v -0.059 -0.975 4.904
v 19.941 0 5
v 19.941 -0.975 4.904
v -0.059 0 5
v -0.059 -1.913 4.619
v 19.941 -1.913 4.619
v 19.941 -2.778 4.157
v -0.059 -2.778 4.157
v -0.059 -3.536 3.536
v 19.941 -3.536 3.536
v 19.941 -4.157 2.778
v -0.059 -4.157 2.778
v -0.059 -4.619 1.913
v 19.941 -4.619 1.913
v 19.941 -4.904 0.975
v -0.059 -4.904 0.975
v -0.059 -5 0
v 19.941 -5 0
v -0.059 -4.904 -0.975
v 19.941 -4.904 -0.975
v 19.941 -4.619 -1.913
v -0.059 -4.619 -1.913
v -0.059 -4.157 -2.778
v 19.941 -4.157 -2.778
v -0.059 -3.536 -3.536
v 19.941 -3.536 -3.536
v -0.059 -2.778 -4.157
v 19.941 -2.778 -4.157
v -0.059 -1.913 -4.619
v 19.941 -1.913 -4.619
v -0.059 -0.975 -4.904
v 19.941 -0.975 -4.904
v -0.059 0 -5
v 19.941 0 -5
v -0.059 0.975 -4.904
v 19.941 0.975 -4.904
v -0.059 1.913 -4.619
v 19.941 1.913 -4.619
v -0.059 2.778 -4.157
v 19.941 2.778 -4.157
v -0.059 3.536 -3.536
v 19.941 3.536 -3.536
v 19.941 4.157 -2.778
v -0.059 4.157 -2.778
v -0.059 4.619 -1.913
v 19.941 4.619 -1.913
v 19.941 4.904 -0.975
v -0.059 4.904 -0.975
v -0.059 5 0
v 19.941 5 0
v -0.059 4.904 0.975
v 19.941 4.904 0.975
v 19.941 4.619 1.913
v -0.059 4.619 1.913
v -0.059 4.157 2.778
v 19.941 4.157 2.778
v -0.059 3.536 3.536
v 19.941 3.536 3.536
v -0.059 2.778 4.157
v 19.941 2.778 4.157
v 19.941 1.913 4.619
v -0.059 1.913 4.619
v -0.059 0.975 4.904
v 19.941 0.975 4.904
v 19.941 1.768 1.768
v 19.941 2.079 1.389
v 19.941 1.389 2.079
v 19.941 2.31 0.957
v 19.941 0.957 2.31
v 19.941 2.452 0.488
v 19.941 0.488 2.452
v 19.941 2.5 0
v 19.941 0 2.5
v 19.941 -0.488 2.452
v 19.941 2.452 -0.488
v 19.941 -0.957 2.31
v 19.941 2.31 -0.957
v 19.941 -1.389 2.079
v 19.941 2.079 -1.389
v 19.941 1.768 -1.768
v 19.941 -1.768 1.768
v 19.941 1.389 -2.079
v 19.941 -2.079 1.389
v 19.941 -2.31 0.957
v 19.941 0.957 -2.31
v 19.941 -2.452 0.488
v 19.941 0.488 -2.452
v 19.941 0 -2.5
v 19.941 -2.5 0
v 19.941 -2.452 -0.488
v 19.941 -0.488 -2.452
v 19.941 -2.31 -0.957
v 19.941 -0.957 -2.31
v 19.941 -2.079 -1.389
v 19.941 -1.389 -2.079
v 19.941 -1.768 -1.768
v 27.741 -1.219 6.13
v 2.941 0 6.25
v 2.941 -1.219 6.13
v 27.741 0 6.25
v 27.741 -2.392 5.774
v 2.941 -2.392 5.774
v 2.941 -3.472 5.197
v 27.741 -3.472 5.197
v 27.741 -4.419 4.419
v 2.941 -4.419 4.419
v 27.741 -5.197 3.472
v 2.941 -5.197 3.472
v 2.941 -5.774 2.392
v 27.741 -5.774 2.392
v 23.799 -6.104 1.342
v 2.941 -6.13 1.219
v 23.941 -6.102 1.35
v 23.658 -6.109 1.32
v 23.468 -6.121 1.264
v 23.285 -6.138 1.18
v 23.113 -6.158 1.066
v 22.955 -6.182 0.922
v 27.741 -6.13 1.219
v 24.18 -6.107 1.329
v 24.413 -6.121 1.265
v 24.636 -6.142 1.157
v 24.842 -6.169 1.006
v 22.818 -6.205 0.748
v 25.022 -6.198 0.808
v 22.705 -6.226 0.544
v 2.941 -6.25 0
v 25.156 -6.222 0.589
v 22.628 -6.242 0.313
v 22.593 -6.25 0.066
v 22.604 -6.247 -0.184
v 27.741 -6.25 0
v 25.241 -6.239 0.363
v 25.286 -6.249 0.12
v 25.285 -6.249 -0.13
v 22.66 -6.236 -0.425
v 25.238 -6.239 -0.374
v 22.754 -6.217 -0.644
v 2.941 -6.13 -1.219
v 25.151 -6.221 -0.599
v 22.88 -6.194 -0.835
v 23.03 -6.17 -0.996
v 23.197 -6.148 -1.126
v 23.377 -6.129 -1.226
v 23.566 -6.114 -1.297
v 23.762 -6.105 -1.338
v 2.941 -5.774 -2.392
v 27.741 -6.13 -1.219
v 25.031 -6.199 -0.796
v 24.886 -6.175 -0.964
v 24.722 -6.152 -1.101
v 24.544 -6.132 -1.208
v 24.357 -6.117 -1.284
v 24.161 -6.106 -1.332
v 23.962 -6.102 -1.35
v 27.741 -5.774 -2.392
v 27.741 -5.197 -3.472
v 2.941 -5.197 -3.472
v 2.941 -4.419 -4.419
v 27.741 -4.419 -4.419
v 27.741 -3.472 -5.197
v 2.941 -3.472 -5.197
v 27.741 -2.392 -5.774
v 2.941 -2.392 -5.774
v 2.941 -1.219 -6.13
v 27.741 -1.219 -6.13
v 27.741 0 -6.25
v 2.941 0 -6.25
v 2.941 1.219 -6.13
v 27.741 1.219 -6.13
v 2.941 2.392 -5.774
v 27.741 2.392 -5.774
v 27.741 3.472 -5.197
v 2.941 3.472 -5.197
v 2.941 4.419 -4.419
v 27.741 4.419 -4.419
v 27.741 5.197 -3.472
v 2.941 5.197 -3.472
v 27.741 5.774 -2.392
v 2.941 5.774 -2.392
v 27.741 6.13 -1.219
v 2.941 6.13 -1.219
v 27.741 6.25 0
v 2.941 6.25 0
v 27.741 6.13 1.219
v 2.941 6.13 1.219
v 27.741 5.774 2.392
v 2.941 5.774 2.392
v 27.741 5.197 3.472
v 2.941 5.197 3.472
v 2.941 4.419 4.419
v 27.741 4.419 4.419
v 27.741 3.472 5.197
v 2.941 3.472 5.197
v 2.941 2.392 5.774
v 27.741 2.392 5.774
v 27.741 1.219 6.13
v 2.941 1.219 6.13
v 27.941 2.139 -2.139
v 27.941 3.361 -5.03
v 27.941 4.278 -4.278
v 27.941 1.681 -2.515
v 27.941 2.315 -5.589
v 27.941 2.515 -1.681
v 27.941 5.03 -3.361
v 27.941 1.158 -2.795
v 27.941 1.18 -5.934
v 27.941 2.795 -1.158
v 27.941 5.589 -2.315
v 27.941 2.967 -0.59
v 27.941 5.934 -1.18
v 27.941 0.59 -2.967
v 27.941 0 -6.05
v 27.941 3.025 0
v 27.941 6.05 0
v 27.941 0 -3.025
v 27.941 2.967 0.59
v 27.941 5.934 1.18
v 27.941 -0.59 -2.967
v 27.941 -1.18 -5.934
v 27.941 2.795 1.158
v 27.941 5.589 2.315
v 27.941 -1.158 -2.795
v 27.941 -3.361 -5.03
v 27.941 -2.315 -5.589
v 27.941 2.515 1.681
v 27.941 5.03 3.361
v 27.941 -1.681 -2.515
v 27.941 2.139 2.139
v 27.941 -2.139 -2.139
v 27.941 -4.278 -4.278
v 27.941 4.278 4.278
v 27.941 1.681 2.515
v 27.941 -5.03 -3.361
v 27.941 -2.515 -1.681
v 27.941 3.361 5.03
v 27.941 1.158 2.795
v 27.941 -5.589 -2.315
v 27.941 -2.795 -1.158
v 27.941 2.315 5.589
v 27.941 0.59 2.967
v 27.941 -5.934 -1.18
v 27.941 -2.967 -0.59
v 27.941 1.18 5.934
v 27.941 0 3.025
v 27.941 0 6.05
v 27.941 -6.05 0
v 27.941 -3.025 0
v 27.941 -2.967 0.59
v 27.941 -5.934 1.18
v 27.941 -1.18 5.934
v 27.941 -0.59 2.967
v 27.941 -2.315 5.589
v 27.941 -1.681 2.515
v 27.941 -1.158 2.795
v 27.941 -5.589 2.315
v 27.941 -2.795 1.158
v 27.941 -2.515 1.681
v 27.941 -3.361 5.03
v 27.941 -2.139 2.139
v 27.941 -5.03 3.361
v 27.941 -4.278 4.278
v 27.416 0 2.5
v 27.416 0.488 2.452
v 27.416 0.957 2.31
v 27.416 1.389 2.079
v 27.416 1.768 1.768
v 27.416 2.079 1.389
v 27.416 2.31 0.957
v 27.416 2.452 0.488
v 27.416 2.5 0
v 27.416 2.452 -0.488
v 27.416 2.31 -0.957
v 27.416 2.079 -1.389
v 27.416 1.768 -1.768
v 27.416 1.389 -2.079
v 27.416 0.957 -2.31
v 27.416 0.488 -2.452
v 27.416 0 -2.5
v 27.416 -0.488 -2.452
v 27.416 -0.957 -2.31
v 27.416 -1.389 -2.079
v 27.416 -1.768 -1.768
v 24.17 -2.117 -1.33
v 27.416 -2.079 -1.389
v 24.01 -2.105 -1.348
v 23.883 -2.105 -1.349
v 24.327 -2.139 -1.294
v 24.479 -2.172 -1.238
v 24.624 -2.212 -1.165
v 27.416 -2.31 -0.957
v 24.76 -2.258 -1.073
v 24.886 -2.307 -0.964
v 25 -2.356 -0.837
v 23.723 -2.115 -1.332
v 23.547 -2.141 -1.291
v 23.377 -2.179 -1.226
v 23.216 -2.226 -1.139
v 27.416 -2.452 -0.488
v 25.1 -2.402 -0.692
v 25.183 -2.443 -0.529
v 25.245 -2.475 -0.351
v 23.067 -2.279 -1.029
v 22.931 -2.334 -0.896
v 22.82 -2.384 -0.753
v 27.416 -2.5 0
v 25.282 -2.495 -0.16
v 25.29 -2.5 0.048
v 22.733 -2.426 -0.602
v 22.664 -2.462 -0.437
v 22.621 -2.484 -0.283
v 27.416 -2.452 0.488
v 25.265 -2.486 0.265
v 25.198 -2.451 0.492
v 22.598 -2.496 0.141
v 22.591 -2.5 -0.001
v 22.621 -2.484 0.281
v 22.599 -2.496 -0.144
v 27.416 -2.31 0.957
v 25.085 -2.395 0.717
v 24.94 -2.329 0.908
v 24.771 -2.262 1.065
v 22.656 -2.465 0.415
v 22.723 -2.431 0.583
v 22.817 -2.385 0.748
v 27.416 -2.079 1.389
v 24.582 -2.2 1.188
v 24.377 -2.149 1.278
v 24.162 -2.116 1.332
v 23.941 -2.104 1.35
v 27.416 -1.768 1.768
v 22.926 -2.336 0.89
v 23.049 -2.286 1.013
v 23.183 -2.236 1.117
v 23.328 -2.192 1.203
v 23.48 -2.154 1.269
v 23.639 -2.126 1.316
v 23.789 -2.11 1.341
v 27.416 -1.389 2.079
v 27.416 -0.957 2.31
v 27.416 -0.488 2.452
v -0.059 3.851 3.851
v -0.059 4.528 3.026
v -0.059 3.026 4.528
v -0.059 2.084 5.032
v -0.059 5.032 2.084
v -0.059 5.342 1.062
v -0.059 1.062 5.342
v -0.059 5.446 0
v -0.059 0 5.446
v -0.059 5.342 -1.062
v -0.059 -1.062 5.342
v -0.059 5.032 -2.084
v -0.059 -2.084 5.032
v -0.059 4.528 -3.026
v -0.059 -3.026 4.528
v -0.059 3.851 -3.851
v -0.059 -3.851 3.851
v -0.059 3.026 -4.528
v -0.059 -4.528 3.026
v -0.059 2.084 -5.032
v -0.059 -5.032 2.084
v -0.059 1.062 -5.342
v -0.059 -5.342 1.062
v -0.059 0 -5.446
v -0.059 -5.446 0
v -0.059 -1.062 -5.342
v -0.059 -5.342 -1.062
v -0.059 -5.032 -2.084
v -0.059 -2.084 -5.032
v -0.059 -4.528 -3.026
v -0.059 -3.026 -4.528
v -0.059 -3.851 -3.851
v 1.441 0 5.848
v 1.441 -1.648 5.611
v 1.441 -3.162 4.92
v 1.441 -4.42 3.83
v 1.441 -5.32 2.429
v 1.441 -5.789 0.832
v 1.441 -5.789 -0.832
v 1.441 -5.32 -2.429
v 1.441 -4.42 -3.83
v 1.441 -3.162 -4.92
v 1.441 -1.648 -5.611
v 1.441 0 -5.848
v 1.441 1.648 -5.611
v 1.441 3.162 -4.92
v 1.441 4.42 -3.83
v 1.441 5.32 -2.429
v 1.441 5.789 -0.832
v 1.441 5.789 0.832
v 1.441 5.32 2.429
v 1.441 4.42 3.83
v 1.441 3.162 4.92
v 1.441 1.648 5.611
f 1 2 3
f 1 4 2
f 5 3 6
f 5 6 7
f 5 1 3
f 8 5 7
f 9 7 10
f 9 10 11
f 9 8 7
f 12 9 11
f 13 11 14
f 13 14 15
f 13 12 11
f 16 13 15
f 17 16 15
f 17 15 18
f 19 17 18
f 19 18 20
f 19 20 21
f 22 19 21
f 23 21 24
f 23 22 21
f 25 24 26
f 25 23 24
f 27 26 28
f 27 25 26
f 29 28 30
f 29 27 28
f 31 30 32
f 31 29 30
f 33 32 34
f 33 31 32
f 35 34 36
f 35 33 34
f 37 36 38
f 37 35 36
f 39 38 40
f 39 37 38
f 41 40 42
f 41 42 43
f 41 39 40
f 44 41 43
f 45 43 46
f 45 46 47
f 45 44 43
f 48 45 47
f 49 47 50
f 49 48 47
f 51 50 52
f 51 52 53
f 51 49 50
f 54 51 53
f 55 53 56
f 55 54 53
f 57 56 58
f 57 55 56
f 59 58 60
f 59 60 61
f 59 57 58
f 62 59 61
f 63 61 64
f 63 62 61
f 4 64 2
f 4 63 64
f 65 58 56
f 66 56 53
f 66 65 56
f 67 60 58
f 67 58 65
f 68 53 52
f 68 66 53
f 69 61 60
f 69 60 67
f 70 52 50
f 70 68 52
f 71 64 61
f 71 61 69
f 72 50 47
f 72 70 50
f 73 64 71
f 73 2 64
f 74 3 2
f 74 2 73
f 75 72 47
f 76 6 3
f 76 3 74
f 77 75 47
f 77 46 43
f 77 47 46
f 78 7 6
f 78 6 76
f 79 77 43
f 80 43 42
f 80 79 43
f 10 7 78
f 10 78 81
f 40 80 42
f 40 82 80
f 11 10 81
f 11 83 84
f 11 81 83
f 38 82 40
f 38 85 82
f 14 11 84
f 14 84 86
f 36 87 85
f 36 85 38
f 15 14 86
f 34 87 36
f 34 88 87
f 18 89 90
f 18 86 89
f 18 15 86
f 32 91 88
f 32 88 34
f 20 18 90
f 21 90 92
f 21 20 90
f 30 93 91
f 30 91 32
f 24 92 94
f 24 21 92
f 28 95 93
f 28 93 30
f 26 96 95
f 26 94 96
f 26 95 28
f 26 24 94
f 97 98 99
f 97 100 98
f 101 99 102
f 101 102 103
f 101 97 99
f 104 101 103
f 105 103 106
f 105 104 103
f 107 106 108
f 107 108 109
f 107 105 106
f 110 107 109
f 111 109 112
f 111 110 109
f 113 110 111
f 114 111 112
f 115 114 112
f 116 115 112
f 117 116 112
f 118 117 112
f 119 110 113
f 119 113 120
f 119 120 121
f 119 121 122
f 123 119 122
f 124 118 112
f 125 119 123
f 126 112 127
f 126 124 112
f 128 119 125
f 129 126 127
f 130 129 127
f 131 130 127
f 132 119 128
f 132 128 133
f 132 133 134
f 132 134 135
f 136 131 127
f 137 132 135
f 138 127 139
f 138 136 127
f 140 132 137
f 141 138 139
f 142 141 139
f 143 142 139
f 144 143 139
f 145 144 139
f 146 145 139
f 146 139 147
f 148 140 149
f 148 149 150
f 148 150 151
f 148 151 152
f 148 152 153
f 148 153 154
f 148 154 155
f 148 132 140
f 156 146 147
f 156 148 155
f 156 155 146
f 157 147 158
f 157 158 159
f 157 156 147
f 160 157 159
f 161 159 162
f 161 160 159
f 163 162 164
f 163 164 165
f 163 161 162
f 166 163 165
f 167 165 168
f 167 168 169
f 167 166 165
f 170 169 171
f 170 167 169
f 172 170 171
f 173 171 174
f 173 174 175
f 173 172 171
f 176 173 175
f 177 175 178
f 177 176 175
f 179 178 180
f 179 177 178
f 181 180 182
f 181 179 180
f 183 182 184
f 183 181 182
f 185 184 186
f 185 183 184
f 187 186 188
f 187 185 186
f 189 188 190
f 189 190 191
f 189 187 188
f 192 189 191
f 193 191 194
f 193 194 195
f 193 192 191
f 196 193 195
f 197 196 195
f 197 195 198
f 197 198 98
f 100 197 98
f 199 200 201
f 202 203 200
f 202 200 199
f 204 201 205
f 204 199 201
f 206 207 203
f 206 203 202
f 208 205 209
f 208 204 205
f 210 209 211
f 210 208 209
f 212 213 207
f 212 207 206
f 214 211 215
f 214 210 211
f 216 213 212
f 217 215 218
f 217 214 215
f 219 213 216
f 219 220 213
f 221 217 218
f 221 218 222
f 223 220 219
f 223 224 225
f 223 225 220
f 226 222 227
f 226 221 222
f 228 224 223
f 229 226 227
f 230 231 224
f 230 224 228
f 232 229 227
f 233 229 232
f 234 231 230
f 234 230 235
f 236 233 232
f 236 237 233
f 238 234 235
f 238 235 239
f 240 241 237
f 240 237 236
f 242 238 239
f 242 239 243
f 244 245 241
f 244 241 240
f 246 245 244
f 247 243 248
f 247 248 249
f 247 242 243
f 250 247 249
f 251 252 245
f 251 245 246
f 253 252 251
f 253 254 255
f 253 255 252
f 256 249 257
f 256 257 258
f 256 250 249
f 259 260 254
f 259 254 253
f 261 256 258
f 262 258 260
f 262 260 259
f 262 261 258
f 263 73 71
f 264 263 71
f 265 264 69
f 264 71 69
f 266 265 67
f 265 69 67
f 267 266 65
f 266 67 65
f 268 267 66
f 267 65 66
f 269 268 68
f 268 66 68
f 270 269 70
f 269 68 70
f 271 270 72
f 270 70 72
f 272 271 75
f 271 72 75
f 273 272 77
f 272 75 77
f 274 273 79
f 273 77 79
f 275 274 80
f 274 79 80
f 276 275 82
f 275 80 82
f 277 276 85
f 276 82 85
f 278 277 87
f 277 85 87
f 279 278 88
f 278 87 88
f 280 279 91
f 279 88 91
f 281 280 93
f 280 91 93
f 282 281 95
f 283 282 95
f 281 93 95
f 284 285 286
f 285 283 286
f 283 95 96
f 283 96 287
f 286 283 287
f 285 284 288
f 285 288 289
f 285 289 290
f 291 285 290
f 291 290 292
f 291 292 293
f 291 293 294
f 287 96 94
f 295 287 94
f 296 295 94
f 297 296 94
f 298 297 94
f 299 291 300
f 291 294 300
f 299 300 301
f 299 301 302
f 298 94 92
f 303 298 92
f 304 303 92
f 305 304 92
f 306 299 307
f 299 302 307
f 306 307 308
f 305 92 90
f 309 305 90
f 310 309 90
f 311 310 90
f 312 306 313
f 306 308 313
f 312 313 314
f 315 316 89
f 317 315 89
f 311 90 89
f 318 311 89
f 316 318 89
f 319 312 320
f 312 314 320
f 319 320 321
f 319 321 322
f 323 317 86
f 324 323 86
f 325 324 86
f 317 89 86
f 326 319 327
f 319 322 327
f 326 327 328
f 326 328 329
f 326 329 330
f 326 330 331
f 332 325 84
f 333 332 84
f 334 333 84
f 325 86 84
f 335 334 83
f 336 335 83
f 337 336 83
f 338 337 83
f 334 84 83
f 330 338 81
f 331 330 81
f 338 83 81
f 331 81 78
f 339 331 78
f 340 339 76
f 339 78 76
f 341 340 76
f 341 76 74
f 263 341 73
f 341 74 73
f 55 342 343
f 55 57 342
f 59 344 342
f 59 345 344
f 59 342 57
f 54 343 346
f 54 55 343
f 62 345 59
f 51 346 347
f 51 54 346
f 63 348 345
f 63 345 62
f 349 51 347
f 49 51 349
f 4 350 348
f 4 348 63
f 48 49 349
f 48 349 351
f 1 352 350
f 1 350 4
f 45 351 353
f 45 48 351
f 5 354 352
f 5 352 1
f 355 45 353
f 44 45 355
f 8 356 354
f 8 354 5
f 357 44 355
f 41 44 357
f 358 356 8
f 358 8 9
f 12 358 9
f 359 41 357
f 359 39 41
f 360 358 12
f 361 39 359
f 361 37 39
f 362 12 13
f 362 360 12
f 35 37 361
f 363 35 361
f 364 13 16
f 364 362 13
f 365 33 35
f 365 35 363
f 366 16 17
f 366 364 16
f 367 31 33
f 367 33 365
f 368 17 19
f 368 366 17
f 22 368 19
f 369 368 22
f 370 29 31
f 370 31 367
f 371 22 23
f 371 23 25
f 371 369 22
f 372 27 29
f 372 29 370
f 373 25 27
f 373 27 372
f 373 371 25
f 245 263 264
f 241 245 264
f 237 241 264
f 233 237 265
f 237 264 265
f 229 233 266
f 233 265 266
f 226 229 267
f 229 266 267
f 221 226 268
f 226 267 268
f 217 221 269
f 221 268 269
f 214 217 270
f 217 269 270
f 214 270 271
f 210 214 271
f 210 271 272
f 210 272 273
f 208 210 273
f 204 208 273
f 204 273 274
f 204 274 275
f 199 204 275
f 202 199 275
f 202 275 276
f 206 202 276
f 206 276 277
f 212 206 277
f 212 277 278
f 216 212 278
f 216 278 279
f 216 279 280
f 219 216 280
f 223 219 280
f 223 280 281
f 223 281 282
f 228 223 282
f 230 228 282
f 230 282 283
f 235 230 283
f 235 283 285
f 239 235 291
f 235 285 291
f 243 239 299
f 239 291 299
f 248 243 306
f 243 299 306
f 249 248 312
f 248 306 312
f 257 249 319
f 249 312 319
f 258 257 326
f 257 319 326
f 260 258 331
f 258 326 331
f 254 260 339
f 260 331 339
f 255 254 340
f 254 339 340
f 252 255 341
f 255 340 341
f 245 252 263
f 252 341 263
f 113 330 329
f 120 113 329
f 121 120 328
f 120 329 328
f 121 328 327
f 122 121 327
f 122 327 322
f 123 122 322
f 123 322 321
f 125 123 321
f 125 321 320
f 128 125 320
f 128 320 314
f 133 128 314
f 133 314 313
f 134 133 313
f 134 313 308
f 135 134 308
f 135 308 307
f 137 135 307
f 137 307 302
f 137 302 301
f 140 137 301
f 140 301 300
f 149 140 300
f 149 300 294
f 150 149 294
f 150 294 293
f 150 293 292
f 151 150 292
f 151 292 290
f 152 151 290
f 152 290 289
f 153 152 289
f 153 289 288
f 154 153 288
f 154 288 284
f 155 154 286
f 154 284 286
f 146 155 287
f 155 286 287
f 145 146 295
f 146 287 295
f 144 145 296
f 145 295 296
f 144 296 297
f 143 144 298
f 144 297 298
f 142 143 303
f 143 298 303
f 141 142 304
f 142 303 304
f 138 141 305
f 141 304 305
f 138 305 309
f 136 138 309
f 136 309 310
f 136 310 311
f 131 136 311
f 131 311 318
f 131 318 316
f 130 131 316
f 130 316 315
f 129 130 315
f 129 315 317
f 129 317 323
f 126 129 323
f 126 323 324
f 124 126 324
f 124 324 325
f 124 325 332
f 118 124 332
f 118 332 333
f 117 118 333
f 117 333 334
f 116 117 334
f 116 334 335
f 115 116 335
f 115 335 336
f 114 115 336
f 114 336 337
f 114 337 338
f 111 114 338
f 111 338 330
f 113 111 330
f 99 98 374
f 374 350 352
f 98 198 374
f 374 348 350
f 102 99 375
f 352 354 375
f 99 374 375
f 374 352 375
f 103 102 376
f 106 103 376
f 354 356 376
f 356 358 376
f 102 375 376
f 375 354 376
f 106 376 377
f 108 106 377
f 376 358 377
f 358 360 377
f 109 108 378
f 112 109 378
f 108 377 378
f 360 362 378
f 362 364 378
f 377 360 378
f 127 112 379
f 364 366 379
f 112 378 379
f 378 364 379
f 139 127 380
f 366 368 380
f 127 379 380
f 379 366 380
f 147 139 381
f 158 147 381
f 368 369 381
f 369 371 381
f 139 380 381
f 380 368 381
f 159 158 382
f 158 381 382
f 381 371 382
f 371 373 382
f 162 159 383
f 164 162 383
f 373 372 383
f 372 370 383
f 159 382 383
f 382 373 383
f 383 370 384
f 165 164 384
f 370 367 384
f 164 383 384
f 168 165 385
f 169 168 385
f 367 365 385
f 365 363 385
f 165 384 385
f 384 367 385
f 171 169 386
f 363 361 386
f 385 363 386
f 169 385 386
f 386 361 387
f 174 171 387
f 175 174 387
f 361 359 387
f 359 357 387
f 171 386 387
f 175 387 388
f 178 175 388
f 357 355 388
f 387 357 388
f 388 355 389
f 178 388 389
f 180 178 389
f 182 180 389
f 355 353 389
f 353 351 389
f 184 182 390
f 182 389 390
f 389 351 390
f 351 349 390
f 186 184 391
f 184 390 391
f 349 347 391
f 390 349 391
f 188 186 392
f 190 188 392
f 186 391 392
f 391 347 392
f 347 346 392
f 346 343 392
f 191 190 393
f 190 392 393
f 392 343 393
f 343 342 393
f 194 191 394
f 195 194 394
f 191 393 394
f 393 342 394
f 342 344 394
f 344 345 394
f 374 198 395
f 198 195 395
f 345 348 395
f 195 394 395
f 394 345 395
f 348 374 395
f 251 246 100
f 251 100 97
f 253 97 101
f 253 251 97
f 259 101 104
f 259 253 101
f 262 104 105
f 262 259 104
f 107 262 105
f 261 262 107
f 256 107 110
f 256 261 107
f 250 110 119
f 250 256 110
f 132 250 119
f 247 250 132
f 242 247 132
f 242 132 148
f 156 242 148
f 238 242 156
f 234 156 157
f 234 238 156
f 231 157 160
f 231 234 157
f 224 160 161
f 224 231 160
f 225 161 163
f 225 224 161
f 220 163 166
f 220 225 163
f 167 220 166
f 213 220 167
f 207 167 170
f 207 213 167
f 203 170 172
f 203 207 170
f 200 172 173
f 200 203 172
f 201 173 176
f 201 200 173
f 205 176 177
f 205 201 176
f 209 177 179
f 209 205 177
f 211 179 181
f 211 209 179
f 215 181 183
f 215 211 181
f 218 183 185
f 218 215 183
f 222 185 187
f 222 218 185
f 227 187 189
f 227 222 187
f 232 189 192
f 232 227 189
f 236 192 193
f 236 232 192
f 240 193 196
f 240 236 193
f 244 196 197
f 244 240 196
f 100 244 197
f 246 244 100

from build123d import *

# Parameters (mm, degrees)
FURO_ROSCADO_DE_M61_D           = 5
FURO_ROSCADO_DE_M61_CSINK_D     = 6.05
FURO_ROSCADO_DE_M61_CSINK_ANGLE = 90
CHANFRO1_SIZE                   = 0.2
CHANFRO3_SIZE                   = 3
CHANFRO3_SIZE2                  = 0.803847577
CORTE_EXTRUS_O1_REACH           = 31.306
CORTE_EXTRUS_O1_END_RADIUS      = 6.25
ESBO_O7_R                       = 1.35


with BuildPart() as part:
    # Esboço1 → Revolução1 (revolve)
    with BuildSketch(Plane(origin=(0, 0, 0), x_dir=(1, 0, 0), z_dir=(0, 1, 0)), mode=Mode.PRIVATE) as revolu_o1_sk:
        Polygon((-0.058940995, 6.25), (27.941059005, 6.25), (27.941059005, 0), (19.941059005, 0), (19.941059005, 5), (-0.058940995, 5), align=None)
    revolve(revolu_o1_sk.sketch.rotate(Axis((0, 0, 0), (1, 0, 0)), 180), axis=Axis((0, 0, 0), (1, 0, 0)))

    # Furo roscado de M61 (through all)
    with Locations(Plane(origin=(27.941059005, 0, 0), x_dir=(0, 0, -1), z_dir=(1, 0, 0))):
        with Locations((0, 0)):
            CounterSinkHole(FURO_ROSCADO_DE_M61_D / 2, FURO_ROSCADO_DE_M61_CSINK_D / 2, counter_sink_angle=FURO_ROSCADO_DE_M61_CSINK_ANGLE)

    # Chanfro1
    chanfro1_edges = [part.edges().sort_by_distance(p)[0] for p in [
        (27.941059005, 0, -6.25),
    ]]
    chamfer(chanfro1_edges, length=CHANFRO1_SIZE)

    # Chanfro3
    chanfro3_edges = [part.edges().sort_by_distance(p)[0] for p in [
        (-0.058940995, 0, -6.25),
    ]]
    chanfro3_side = [part.faces().sort_by_distance(p)[0] for p in [
        (13.841059005, 0, -6.25),
    ]]
    chamfer(chanfro3_edges, length=CHANFRO3_SIZE, length2=CHANFRO3_SIZE2, reference=chanfro3_side[0])

    # Corte-extrusão1: up to this cylinder (the profile starts inside it)
    corte_extrus_o1_end = Plane(origin=(23.941059, 0, 0), z_dir=(-1, 0, 0)) * Cylinder(CORTE_EXTRUS_O1_END_RADIUS, 76.112, mode=Mode.PRIVATE)
    # Esboço7 → Corte-extrusão1 (cut, up to the surface)
    with BuildSketch(Plane(origin=(0, 0, 0), x_dir=(1, 0, 0), z_dir=(0, 1, 0)), mode=Mode.PRIVATE) as corte_extrus_o1_sk1:
        with Locations(Location((23.941059005, 0, 0), (0, 0, 270))):
            Circle(ESBO_O7_R)
    corte_extrus_o1_tool1 = extrude(corte_extrus_o1_sk1.sketch, amount=-CORTE_EXTRUS_O1_REACH, mode=Mode.PRIVATE) & corte_extrus_o1_end
    add(corte_extrus_o1_tool1.solids().sort_by_distance((23.941059, 0, 0))[0], mode=Mode.SUBTRACT)


solid = part.part
